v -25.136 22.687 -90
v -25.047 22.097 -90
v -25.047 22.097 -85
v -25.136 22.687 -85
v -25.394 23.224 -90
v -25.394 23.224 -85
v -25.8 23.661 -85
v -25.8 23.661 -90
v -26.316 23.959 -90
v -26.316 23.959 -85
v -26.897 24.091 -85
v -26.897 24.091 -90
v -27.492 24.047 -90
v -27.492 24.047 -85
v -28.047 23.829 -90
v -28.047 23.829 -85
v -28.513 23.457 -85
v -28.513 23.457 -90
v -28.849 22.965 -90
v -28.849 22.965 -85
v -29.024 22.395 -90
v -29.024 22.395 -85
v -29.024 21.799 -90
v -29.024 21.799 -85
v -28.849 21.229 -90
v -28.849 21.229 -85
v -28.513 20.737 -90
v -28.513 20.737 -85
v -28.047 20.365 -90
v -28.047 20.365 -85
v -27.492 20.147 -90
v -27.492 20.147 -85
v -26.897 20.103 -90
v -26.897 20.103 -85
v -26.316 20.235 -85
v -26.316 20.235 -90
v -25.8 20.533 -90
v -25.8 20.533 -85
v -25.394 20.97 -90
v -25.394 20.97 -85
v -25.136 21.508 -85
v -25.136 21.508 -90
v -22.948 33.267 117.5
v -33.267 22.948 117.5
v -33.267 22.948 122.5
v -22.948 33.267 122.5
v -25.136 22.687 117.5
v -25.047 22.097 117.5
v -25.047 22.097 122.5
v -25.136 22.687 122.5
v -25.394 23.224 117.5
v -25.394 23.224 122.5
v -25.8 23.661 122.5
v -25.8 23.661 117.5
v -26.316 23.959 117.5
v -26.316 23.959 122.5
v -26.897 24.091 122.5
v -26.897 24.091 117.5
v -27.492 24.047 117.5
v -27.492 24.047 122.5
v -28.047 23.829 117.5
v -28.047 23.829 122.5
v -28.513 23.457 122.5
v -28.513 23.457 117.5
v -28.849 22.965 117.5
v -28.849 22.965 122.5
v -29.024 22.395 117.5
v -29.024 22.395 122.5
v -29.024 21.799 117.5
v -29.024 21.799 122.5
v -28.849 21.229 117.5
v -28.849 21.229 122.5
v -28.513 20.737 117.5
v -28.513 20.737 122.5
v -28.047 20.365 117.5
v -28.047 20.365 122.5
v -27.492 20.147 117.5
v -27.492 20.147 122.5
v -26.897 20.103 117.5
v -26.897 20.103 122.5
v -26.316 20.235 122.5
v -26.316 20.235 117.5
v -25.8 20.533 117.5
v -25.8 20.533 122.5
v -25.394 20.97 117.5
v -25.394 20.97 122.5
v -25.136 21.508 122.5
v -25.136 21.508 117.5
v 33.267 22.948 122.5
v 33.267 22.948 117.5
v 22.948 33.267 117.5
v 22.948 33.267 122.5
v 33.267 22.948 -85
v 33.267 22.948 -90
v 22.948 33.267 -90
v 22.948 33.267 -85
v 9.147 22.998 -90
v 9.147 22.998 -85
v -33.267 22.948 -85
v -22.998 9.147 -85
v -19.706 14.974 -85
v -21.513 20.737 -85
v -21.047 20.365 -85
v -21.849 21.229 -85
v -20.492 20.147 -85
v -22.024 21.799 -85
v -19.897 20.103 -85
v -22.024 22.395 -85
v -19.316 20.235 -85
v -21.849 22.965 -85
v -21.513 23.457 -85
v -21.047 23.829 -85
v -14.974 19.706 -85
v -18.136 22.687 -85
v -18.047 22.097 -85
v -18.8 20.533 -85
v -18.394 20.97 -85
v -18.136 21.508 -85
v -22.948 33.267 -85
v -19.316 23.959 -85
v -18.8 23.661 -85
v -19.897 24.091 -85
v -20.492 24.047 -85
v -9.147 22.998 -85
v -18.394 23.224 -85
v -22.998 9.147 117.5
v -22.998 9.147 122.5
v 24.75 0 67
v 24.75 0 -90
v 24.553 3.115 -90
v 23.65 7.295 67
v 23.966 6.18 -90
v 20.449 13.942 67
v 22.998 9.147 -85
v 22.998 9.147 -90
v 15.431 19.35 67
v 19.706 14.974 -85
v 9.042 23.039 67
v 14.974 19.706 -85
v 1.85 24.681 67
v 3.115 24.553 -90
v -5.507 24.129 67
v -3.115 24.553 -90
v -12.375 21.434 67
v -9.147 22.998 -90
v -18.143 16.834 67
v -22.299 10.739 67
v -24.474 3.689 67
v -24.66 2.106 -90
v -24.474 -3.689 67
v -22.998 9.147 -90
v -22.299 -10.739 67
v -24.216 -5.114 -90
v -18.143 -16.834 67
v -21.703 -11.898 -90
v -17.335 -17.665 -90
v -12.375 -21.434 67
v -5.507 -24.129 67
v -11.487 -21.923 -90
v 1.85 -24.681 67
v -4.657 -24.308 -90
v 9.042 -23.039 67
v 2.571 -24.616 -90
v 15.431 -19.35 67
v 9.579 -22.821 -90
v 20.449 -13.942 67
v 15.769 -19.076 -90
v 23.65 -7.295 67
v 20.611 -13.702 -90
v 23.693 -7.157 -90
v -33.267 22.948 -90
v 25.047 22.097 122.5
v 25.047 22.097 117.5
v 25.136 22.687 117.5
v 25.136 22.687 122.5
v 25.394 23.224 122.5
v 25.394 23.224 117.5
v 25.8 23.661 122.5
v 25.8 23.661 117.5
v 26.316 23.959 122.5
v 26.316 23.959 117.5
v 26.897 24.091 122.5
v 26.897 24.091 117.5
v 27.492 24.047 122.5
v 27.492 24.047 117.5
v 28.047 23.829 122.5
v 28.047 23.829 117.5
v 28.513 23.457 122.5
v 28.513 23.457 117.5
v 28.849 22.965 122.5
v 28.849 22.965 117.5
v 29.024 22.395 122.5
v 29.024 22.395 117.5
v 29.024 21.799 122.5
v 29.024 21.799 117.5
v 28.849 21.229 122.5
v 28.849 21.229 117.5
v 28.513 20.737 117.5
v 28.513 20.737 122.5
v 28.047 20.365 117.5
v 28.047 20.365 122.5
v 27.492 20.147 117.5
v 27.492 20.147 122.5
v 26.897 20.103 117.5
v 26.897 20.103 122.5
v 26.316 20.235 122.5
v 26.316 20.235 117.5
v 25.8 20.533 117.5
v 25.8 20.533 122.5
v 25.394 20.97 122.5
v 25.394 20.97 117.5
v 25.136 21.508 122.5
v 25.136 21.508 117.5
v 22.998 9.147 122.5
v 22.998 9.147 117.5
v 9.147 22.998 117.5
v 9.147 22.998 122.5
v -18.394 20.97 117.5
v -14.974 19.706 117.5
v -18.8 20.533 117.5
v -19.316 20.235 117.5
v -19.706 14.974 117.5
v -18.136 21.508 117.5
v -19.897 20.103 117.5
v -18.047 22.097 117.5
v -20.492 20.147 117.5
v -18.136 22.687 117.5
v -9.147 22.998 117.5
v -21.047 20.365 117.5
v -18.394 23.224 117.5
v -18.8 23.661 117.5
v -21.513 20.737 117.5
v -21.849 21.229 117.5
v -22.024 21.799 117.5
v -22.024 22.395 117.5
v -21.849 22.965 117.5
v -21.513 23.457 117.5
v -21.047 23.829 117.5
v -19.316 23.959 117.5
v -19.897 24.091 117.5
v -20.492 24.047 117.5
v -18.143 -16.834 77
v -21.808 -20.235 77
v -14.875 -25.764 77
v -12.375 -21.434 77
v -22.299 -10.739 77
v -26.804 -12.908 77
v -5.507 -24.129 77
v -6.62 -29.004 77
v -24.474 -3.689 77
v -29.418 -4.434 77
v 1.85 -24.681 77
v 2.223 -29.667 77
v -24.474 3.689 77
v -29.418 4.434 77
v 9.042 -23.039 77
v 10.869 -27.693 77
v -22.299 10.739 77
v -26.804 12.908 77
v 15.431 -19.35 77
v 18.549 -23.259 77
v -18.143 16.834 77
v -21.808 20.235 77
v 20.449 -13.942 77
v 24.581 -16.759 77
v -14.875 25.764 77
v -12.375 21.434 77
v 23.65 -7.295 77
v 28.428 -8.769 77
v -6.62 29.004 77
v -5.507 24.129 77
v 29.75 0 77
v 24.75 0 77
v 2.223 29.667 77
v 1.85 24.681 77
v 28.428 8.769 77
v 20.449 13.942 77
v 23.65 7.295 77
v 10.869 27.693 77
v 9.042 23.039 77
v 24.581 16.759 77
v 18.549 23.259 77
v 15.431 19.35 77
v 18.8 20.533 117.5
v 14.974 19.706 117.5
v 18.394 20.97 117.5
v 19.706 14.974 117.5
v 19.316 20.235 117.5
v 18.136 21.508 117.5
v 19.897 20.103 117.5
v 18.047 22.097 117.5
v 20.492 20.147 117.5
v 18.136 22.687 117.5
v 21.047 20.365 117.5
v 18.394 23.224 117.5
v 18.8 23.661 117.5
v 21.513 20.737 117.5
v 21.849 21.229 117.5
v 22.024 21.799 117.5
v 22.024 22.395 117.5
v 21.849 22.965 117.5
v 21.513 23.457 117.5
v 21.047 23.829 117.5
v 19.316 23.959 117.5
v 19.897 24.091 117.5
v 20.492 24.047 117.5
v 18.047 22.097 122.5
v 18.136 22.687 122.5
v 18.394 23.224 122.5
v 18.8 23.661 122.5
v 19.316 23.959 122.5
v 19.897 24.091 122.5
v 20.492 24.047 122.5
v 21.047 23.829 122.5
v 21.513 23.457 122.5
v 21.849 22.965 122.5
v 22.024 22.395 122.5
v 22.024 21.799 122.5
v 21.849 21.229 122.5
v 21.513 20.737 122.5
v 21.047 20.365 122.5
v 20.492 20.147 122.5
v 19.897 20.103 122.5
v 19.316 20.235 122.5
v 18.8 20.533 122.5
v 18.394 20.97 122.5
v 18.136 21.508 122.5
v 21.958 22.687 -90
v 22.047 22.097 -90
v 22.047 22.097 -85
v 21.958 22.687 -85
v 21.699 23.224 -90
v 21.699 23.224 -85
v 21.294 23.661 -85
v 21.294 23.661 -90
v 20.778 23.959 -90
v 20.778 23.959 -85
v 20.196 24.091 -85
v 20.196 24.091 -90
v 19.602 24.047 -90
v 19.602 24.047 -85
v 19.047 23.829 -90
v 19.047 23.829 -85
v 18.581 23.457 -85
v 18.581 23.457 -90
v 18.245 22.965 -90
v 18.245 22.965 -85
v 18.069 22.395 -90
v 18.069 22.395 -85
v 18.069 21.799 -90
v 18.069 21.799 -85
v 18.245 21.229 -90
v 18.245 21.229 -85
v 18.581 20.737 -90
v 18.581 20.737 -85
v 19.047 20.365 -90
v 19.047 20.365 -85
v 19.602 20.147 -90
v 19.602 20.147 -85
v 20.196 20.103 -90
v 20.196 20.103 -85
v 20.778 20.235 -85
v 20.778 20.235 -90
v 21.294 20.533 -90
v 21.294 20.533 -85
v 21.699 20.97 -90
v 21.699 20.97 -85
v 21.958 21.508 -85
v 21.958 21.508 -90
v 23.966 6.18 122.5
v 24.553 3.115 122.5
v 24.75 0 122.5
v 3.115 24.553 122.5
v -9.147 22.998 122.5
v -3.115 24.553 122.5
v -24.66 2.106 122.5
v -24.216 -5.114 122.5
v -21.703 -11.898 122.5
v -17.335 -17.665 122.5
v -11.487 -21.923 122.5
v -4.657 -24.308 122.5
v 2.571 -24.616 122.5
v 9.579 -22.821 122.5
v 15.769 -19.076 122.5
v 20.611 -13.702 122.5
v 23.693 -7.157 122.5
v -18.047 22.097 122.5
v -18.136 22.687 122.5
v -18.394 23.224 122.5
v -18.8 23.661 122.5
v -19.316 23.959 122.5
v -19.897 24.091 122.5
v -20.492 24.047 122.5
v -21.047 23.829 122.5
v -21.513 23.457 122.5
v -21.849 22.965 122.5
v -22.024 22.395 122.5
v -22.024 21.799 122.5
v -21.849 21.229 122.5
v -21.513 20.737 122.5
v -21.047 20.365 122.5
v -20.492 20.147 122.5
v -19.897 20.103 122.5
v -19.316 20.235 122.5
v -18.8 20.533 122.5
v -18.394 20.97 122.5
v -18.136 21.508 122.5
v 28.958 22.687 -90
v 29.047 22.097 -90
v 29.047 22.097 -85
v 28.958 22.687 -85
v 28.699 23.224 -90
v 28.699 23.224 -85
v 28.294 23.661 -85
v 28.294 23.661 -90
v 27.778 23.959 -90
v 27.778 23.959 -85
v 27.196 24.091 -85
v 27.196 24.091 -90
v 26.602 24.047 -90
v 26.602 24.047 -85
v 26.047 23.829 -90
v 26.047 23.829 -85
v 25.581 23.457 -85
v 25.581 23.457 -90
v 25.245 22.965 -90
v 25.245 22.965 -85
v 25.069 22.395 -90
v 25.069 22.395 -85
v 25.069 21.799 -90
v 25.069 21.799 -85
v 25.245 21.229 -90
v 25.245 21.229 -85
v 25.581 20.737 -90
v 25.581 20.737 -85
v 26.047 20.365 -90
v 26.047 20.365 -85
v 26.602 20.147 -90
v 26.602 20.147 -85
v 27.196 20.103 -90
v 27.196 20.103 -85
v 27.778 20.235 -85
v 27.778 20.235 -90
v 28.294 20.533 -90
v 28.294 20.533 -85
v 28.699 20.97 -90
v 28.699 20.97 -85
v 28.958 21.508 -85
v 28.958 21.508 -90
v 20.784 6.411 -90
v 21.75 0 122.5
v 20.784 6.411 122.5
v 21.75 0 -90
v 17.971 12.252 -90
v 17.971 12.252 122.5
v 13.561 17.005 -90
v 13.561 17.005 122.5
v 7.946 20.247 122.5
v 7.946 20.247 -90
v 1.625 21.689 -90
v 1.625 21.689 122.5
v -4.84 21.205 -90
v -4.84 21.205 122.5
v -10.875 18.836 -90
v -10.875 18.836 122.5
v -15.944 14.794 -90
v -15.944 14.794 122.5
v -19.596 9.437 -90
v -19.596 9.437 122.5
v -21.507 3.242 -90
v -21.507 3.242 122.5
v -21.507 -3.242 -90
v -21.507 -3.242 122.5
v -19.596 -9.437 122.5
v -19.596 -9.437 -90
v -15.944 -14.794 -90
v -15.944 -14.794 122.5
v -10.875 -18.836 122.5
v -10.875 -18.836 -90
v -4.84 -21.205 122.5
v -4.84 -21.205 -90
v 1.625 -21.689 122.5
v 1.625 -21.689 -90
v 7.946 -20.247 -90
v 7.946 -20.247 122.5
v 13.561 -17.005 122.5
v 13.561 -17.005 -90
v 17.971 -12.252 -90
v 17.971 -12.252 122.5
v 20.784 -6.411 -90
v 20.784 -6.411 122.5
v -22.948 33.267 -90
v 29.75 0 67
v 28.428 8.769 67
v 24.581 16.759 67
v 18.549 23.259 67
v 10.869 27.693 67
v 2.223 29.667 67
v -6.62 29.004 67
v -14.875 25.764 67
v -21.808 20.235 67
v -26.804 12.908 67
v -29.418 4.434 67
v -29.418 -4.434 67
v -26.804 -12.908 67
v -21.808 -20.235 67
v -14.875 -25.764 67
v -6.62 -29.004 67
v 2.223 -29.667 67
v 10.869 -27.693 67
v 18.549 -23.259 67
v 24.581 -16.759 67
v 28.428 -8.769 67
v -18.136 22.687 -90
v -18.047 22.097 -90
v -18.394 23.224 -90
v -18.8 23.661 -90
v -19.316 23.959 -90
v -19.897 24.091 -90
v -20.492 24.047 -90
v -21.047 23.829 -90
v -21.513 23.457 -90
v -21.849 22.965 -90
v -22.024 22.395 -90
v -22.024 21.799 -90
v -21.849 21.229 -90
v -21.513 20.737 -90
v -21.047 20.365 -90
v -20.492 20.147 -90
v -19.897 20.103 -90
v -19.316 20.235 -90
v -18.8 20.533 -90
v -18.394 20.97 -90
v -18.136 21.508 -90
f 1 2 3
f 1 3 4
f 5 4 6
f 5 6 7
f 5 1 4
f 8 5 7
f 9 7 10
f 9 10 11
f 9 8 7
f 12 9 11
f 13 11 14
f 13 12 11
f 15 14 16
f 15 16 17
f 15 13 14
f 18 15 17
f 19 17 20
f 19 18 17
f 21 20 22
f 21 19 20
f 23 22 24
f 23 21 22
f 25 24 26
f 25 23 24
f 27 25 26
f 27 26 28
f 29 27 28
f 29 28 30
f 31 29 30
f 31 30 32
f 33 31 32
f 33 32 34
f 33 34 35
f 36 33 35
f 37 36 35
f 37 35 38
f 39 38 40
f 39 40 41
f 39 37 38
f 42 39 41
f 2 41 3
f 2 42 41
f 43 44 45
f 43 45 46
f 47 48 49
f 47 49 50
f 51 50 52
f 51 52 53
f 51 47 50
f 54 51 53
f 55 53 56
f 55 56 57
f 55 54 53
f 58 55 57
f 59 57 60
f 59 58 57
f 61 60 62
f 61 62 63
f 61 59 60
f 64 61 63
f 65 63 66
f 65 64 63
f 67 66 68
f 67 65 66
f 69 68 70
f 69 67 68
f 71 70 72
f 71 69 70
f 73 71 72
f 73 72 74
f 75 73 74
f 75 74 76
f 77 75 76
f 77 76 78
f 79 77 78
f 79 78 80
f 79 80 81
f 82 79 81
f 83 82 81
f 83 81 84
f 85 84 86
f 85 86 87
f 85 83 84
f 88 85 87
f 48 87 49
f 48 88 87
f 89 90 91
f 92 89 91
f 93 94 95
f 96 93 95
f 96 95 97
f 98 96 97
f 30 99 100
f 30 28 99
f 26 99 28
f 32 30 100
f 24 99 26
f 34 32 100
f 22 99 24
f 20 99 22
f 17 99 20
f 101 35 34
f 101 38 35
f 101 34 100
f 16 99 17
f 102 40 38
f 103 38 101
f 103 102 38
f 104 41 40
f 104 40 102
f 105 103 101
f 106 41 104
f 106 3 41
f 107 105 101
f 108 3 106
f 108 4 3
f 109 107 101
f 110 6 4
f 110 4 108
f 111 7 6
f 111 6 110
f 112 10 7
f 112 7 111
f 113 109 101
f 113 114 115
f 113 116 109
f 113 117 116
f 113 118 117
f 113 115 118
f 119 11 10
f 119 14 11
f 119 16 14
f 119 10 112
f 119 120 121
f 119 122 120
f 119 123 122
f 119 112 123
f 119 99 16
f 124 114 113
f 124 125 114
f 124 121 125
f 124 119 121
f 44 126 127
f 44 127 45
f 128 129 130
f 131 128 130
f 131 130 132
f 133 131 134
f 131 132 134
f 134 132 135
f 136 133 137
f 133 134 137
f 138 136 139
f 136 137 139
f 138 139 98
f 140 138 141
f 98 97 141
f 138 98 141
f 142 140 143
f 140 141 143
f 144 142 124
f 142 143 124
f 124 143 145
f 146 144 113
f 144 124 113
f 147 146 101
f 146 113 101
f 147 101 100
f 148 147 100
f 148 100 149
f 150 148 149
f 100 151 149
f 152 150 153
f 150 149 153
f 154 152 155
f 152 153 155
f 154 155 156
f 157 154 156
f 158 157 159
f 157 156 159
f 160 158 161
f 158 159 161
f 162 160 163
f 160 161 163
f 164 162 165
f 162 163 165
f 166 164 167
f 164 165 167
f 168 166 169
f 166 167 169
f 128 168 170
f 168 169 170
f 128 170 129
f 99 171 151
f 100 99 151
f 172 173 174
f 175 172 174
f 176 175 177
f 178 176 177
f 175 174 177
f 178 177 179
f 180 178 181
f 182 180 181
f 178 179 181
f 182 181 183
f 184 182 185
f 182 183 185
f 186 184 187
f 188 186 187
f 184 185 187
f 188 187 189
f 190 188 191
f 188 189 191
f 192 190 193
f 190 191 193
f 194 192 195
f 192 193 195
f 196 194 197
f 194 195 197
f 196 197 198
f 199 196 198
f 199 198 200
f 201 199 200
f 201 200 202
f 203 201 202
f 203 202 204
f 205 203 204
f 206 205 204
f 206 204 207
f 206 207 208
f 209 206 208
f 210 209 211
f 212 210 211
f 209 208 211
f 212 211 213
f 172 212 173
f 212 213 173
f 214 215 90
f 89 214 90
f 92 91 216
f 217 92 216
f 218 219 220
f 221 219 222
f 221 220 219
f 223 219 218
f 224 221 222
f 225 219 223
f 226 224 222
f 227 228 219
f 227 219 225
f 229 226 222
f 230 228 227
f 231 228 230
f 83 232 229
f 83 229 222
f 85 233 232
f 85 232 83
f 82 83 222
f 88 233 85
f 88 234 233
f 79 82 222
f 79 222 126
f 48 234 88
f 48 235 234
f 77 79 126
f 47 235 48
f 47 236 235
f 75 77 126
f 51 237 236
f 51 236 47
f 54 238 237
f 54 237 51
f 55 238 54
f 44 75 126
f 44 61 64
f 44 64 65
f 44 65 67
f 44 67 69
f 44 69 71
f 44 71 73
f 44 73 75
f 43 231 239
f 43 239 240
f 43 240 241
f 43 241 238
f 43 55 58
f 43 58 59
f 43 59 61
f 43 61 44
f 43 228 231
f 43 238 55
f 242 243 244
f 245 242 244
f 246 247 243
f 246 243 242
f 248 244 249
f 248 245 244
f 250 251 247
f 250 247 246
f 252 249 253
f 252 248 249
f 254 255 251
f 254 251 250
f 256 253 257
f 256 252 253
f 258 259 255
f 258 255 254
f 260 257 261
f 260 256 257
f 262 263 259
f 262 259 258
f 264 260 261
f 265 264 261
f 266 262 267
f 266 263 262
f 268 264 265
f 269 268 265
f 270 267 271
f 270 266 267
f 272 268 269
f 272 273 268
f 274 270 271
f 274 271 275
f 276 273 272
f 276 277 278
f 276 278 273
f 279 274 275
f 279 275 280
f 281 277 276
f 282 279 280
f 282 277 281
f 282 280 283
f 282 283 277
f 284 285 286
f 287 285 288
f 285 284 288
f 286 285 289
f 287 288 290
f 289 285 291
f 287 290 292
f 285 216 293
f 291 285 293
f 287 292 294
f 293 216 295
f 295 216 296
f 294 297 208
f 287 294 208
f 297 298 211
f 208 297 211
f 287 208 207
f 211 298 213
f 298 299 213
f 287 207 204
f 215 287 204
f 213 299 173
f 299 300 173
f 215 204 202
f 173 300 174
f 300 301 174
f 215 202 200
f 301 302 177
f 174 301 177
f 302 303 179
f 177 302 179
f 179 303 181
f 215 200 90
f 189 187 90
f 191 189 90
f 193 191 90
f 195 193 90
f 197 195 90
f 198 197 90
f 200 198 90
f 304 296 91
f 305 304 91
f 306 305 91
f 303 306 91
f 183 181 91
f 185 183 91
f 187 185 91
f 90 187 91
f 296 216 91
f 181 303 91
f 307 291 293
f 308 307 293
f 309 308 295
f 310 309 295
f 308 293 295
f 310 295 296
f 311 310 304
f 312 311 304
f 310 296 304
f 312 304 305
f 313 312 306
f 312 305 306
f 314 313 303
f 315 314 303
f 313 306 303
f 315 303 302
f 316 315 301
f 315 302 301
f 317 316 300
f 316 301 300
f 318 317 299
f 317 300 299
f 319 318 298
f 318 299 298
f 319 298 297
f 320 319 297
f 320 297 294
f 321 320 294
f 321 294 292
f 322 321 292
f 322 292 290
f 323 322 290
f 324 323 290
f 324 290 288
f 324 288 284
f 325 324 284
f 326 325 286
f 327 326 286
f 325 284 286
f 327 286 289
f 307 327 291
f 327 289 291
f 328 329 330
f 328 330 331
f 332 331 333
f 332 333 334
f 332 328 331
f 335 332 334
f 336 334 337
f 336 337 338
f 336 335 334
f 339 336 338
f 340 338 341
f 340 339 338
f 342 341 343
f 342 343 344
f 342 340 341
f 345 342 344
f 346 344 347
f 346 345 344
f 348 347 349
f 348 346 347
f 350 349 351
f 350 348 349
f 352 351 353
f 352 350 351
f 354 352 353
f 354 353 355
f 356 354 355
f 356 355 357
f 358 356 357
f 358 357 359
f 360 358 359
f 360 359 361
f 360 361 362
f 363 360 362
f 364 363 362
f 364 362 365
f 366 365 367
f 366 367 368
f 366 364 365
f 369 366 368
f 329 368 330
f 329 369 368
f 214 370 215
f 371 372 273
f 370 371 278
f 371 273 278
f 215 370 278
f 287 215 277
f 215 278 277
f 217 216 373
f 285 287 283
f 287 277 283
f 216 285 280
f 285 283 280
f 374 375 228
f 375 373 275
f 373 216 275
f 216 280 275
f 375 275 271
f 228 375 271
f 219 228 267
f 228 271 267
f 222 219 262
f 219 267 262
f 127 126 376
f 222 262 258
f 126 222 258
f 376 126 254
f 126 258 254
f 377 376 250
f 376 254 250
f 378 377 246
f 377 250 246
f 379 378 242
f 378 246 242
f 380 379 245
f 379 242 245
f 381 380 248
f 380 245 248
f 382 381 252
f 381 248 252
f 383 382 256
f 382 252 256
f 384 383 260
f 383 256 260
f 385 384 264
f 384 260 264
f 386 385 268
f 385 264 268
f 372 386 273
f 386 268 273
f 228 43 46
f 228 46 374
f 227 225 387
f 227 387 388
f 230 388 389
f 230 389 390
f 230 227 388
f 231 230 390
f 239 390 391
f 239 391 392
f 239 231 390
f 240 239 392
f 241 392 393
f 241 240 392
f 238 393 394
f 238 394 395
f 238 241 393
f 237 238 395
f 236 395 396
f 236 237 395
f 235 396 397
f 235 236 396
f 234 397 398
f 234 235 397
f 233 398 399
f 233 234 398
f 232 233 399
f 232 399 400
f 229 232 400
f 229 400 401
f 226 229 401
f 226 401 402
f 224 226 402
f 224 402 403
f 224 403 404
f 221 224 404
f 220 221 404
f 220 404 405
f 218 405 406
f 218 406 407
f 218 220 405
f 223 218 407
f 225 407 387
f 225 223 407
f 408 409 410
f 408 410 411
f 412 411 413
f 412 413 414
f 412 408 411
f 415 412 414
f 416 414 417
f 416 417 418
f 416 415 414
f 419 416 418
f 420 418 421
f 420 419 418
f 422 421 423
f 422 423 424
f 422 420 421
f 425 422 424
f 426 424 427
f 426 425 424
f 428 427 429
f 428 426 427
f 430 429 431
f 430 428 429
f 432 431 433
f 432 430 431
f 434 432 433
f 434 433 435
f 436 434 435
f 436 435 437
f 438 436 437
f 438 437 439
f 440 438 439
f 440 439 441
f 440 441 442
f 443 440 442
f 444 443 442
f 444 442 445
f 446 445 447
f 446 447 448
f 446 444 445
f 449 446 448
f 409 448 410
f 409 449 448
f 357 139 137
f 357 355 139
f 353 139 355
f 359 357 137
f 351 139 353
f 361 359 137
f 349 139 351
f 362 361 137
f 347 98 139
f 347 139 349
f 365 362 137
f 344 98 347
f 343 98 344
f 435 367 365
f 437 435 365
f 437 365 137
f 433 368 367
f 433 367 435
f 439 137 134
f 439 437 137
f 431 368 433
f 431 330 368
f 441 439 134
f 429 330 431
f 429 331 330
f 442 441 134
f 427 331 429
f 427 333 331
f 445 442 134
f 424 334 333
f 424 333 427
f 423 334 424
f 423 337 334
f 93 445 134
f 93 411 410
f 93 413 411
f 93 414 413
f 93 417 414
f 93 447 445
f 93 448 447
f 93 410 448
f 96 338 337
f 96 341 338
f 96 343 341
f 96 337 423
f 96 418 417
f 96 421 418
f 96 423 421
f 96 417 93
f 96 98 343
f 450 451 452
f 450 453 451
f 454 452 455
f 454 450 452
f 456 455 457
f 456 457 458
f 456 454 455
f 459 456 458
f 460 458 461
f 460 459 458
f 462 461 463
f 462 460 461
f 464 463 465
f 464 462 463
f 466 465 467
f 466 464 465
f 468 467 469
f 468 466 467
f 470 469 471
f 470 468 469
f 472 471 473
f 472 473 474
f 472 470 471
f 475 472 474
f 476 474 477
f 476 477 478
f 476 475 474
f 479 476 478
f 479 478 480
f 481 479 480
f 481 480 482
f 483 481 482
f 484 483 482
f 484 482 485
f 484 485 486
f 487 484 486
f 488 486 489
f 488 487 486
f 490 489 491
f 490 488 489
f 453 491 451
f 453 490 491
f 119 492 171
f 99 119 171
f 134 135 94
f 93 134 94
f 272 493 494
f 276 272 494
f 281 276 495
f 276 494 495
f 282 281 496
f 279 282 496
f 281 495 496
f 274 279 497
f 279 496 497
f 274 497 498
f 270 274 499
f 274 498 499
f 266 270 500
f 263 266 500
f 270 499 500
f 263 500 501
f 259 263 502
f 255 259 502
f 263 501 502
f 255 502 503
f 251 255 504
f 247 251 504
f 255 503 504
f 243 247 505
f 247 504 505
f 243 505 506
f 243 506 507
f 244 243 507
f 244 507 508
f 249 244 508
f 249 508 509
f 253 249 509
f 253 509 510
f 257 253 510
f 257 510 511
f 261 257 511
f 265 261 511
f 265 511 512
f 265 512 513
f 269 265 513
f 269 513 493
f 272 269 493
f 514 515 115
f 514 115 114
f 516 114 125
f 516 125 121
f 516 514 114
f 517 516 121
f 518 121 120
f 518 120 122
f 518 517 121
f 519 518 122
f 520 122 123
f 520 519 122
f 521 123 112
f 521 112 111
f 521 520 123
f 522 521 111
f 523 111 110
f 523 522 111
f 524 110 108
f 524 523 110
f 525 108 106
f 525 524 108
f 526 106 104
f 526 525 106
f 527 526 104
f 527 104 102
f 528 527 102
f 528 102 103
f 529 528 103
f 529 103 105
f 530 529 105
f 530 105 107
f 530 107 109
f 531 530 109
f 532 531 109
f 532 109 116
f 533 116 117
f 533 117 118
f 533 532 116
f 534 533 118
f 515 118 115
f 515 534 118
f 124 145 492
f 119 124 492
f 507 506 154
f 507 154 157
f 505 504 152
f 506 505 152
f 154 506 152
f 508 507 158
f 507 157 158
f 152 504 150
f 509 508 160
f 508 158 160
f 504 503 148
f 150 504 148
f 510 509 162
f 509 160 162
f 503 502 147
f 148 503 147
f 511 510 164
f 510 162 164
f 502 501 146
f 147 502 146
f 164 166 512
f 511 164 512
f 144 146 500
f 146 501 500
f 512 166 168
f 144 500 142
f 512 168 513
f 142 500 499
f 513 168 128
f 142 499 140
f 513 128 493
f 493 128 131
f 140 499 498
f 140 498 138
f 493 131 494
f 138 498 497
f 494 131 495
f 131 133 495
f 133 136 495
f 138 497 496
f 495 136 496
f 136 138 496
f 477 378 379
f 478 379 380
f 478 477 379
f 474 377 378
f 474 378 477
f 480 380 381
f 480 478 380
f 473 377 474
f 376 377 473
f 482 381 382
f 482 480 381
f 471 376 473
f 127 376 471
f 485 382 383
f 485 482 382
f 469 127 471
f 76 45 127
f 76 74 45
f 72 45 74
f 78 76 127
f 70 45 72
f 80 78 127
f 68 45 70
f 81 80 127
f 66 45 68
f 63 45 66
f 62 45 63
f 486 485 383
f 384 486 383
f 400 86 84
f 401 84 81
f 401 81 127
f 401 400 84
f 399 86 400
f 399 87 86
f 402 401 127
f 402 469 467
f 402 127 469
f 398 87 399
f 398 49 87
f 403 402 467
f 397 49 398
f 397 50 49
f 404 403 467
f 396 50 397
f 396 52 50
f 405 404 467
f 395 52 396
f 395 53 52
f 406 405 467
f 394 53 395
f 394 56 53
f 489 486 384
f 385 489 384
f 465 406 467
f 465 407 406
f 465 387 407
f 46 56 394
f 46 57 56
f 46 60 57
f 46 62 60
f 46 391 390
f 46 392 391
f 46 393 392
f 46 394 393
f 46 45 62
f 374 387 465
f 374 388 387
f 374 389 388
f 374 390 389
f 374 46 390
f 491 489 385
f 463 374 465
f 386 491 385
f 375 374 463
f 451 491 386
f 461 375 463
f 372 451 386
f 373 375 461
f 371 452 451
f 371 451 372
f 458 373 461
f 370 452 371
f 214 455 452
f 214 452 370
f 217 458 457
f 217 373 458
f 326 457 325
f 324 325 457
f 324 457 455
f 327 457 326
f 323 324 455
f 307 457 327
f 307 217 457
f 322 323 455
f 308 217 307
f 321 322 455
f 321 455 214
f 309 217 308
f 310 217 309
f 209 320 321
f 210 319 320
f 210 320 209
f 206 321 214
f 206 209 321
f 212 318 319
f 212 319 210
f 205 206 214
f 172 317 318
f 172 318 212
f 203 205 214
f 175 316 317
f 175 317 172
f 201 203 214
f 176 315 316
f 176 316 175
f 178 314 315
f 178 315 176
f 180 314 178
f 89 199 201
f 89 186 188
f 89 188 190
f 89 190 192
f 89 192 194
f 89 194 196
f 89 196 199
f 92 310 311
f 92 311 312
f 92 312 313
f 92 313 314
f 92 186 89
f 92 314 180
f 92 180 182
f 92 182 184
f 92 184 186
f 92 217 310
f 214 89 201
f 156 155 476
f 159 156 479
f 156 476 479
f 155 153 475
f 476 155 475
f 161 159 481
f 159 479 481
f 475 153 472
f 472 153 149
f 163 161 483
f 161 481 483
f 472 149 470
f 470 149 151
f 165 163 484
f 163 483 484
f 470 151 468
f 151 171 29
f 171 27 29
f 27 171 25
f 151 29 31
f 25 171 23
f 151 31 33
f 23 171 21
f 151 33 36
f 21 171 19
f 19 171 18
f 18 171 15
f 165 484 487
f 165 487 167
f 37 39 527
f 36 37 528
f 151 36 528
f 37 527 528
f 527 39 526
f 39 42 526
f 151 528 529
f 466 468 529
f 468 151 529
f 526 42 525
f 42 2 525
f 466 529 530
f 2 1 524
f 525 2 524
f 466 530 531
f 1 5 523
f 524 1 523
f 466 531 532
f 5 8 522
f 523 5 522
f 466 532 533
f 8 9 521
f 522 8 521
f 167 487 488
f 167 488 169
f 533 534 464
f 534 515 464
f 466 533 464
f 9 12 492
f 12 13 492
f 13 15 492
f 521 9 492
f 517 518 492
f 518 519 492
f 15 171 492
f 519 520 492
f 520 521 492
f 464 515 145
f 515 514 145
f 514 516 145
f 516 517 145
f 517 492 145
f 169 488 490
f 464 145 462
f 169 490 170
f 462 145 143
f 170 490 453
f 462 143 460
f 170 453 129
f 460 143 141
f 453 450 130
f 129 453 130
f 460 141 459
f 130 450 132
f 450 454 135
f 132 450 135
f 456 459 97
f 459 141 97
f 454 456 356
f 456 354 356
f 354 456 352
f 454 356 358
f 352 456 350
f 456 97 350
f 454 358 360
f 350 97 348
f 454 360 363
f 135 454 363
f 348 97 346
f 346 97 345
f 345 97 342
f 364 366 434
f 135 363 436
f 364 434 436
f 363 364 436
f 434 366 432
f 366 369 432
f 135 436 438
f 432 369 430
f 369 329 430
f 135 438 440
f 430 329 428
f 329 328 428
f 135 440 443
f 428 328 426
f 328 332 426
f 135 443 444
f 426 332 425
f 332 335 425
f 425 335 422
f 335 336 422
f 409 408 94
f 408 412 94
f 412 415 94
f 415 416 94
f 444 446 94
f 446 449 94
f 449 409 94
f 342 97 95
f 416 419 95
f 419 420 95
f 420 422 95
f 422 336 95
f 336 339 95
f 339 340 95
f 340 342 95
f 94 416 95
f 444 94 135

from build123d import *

# Parameters (mm, degrees)
BOSS_EXTRUDE1_DEPTH      = 120
BOSS_EXTRUDE1_DEPTH_BACK = 90
SKETCH1_R                = 24.75
SKETCH1_R_2              = 21.75
BOSS_EXTRUDE3_START      = 72
SKETCH5_R                = 29.75
SKETCH5_R_2              = 21.75
BOSS_EXTRUDE3_DEPTH      = 5
SKETCH7_R                = 24.75
SKETCH7_R_2              = 21.75
BOSS_EXTRUDE4_DEPTH      = 2.5
BOSS_EXTRUDE5_START      = -5
SKETCH6_R                = 2
BOSS_EXTRUDE5_DEPTH      = 5
MIRROR2_START            = 67
MIRROR2_OUTLINE_R        = 29.75
MIRROR2_OUTLINE_R_2      = 24.75
MIRROR2_DEPTH            = 5
MIRROR2_START_2          = -90
MIRROR2_2_OUTLINE_R      = 2
MIRROR2_2_DEPTH          = 5


# Read off the part's stored shape, not the designer's step: Mirror2
with BuildPart() as part:
    # Sketch1 → Boss-Extrude1 (new, two sides: drawn at the far end of the back side and taken through both)
    with BuildSketch(Plane.XY.offset(-BOSS_EXTRUDE1_DEPTH_BACK)):
        Circle(SKETCH1_R)
        Circle(SKETCH1_R_2, mode=Mode.SUBTRACT)
    extrude(amount=BOSS_EXTRUDE1_DEPTH + BOSS_EXTRUDE1_DEPTH_BACK)

    # Sketch5 → Boss-Extrude3 (add)
    with BuildSketch(Plane.XY.offset(BOSS_EXTRUDE3_START)):
        Circle(SKETCH5_R)
        Circle(SKETCH5_R_2, mode=Mode.SUBTRACT)
    extrude(amount=BOSS_EXTRUDE3_DEPTH)

    # Sketch7 → Boss-Extrude4 (add, symmetric)
    with BuildSketch(Plane.XY.offset(120)):
        Circle(SKETCH7_R)
        Circle(SKETCH7_R_2, mode=Mode.SUBTRACT)
    extrude(amount=BOSS_EXTRUDE4_DEPTH, both=True)

    # Sketch6 → Boss-Extrude5 (add)
    with BuildSketch(Plane.XY.offset(122.5).offset(BOSS_EXTRUDE5_START)):
        with BuildLine():
            Line((-22.997666259, 9.147122314), (-33.267406372, 22.947582732))
            Line((-33.267406372, 22.947582732), (-22.947582732, 33.267406372))
            Line((-22.947582732, 33.267406372), (-9.147122314, 22.997666259))
            ThreePointArc((-9.147122314, 22.997666259), (-17.500892834, 17.500892834), (-22.997666259, 9.147122314))
        make_face()
        with Locations((-20.04683438, 22.097086912)):
            Circle(SKETCH6_R, mode=Mode.SUBTRACT)
        with Locations((-27.04683438, 22.097086912)):
            Circle(SKETCH6_R, mode=Mode.SUBTRACT)
    boss_extrude5 = extrude(amount=BOSS_EXTRUDE5_DEPTH)

    # Mirror1: Boss-Extrude5 across plane
    add(boss_extrude5.mirror(Plane(origin=(0, 0, 0), x_dir=(0, 0, 1), z_dir=(1, 0, 0))))

    # Mirror2 outline → Mirror2 (add)
    with BuildSketch(Plane.XY.offset(MIRROR2_START)):
        Circle(MIRROR2_OUTLINE_R)
        Circle(MIRROR2_OUTLINE_R_2, mode=Mode.SUBTRACT)
    extrude(amount=MIRROR2_DEPTH)

    # Mirror2 2 outline → Mirror2 2 (add)
    # profile 1 of 2: a face of its own
    with BuildSketch(Plane.XY.offset(MIRROR2_START_2)):
        with BuildLine():
            Line((22.997666259, 9.147122314), (33.267406372, 22.947582732))
            Line((33.267406372, 22.947582732), (22.947582732, 33.267406372))
            Line((22.947582732, 33.267406372), (9.147122314, 22.997666259))
            ThreePointArc((9.147122314, 22.997666259), (17.500892834, 17.500892834), (22.997666259, 9.147122314))
        make_face()
        with Locations((20.04683438, 22.097086912)):
            Circle(MIRROR2_2_OUTLINE_R, mode=Mode.SUBTRACT)
        with Locations((27.04683438, 22.097086912)):
            Circle(MIRROR2_2_OUTLINE_R, mode=Mode.SUBTRACT)
    # profile 2 of 2: a face of its own
    with BuildSketch(Plane.XY.offset(MIRROR2_START_2)):
        with BuildLine():
            Line((-33.267406372, 22.947582732), (-22.997666259, 9.147122314))
            ThreePointArc((-22.997666259, 9.147122314), (-17.500892834, 17.500892834), (-9.147122314, 22.997666259))
            Line((-9.147122314, 22.997666259), (-22.947582732, 33.267406372))
            Line((-22.947582732, 33.267406372), (-33.267406372, 22.947582732))
        make_face()
        with Locations((-20.04683438, 22.097086912)):
            Circle(MIRROR2_2_OUTLINE_R, mode=Mode.SUBTRACT)
        with Locations((-27.04683438, 22.097086912)):
            Circle(MIRROR2_2_OUTLINE_R, mode=Mode.SUBTRACT)
    extrude(amount=MIRROR2_2_DEPTH)


solid = part.part
